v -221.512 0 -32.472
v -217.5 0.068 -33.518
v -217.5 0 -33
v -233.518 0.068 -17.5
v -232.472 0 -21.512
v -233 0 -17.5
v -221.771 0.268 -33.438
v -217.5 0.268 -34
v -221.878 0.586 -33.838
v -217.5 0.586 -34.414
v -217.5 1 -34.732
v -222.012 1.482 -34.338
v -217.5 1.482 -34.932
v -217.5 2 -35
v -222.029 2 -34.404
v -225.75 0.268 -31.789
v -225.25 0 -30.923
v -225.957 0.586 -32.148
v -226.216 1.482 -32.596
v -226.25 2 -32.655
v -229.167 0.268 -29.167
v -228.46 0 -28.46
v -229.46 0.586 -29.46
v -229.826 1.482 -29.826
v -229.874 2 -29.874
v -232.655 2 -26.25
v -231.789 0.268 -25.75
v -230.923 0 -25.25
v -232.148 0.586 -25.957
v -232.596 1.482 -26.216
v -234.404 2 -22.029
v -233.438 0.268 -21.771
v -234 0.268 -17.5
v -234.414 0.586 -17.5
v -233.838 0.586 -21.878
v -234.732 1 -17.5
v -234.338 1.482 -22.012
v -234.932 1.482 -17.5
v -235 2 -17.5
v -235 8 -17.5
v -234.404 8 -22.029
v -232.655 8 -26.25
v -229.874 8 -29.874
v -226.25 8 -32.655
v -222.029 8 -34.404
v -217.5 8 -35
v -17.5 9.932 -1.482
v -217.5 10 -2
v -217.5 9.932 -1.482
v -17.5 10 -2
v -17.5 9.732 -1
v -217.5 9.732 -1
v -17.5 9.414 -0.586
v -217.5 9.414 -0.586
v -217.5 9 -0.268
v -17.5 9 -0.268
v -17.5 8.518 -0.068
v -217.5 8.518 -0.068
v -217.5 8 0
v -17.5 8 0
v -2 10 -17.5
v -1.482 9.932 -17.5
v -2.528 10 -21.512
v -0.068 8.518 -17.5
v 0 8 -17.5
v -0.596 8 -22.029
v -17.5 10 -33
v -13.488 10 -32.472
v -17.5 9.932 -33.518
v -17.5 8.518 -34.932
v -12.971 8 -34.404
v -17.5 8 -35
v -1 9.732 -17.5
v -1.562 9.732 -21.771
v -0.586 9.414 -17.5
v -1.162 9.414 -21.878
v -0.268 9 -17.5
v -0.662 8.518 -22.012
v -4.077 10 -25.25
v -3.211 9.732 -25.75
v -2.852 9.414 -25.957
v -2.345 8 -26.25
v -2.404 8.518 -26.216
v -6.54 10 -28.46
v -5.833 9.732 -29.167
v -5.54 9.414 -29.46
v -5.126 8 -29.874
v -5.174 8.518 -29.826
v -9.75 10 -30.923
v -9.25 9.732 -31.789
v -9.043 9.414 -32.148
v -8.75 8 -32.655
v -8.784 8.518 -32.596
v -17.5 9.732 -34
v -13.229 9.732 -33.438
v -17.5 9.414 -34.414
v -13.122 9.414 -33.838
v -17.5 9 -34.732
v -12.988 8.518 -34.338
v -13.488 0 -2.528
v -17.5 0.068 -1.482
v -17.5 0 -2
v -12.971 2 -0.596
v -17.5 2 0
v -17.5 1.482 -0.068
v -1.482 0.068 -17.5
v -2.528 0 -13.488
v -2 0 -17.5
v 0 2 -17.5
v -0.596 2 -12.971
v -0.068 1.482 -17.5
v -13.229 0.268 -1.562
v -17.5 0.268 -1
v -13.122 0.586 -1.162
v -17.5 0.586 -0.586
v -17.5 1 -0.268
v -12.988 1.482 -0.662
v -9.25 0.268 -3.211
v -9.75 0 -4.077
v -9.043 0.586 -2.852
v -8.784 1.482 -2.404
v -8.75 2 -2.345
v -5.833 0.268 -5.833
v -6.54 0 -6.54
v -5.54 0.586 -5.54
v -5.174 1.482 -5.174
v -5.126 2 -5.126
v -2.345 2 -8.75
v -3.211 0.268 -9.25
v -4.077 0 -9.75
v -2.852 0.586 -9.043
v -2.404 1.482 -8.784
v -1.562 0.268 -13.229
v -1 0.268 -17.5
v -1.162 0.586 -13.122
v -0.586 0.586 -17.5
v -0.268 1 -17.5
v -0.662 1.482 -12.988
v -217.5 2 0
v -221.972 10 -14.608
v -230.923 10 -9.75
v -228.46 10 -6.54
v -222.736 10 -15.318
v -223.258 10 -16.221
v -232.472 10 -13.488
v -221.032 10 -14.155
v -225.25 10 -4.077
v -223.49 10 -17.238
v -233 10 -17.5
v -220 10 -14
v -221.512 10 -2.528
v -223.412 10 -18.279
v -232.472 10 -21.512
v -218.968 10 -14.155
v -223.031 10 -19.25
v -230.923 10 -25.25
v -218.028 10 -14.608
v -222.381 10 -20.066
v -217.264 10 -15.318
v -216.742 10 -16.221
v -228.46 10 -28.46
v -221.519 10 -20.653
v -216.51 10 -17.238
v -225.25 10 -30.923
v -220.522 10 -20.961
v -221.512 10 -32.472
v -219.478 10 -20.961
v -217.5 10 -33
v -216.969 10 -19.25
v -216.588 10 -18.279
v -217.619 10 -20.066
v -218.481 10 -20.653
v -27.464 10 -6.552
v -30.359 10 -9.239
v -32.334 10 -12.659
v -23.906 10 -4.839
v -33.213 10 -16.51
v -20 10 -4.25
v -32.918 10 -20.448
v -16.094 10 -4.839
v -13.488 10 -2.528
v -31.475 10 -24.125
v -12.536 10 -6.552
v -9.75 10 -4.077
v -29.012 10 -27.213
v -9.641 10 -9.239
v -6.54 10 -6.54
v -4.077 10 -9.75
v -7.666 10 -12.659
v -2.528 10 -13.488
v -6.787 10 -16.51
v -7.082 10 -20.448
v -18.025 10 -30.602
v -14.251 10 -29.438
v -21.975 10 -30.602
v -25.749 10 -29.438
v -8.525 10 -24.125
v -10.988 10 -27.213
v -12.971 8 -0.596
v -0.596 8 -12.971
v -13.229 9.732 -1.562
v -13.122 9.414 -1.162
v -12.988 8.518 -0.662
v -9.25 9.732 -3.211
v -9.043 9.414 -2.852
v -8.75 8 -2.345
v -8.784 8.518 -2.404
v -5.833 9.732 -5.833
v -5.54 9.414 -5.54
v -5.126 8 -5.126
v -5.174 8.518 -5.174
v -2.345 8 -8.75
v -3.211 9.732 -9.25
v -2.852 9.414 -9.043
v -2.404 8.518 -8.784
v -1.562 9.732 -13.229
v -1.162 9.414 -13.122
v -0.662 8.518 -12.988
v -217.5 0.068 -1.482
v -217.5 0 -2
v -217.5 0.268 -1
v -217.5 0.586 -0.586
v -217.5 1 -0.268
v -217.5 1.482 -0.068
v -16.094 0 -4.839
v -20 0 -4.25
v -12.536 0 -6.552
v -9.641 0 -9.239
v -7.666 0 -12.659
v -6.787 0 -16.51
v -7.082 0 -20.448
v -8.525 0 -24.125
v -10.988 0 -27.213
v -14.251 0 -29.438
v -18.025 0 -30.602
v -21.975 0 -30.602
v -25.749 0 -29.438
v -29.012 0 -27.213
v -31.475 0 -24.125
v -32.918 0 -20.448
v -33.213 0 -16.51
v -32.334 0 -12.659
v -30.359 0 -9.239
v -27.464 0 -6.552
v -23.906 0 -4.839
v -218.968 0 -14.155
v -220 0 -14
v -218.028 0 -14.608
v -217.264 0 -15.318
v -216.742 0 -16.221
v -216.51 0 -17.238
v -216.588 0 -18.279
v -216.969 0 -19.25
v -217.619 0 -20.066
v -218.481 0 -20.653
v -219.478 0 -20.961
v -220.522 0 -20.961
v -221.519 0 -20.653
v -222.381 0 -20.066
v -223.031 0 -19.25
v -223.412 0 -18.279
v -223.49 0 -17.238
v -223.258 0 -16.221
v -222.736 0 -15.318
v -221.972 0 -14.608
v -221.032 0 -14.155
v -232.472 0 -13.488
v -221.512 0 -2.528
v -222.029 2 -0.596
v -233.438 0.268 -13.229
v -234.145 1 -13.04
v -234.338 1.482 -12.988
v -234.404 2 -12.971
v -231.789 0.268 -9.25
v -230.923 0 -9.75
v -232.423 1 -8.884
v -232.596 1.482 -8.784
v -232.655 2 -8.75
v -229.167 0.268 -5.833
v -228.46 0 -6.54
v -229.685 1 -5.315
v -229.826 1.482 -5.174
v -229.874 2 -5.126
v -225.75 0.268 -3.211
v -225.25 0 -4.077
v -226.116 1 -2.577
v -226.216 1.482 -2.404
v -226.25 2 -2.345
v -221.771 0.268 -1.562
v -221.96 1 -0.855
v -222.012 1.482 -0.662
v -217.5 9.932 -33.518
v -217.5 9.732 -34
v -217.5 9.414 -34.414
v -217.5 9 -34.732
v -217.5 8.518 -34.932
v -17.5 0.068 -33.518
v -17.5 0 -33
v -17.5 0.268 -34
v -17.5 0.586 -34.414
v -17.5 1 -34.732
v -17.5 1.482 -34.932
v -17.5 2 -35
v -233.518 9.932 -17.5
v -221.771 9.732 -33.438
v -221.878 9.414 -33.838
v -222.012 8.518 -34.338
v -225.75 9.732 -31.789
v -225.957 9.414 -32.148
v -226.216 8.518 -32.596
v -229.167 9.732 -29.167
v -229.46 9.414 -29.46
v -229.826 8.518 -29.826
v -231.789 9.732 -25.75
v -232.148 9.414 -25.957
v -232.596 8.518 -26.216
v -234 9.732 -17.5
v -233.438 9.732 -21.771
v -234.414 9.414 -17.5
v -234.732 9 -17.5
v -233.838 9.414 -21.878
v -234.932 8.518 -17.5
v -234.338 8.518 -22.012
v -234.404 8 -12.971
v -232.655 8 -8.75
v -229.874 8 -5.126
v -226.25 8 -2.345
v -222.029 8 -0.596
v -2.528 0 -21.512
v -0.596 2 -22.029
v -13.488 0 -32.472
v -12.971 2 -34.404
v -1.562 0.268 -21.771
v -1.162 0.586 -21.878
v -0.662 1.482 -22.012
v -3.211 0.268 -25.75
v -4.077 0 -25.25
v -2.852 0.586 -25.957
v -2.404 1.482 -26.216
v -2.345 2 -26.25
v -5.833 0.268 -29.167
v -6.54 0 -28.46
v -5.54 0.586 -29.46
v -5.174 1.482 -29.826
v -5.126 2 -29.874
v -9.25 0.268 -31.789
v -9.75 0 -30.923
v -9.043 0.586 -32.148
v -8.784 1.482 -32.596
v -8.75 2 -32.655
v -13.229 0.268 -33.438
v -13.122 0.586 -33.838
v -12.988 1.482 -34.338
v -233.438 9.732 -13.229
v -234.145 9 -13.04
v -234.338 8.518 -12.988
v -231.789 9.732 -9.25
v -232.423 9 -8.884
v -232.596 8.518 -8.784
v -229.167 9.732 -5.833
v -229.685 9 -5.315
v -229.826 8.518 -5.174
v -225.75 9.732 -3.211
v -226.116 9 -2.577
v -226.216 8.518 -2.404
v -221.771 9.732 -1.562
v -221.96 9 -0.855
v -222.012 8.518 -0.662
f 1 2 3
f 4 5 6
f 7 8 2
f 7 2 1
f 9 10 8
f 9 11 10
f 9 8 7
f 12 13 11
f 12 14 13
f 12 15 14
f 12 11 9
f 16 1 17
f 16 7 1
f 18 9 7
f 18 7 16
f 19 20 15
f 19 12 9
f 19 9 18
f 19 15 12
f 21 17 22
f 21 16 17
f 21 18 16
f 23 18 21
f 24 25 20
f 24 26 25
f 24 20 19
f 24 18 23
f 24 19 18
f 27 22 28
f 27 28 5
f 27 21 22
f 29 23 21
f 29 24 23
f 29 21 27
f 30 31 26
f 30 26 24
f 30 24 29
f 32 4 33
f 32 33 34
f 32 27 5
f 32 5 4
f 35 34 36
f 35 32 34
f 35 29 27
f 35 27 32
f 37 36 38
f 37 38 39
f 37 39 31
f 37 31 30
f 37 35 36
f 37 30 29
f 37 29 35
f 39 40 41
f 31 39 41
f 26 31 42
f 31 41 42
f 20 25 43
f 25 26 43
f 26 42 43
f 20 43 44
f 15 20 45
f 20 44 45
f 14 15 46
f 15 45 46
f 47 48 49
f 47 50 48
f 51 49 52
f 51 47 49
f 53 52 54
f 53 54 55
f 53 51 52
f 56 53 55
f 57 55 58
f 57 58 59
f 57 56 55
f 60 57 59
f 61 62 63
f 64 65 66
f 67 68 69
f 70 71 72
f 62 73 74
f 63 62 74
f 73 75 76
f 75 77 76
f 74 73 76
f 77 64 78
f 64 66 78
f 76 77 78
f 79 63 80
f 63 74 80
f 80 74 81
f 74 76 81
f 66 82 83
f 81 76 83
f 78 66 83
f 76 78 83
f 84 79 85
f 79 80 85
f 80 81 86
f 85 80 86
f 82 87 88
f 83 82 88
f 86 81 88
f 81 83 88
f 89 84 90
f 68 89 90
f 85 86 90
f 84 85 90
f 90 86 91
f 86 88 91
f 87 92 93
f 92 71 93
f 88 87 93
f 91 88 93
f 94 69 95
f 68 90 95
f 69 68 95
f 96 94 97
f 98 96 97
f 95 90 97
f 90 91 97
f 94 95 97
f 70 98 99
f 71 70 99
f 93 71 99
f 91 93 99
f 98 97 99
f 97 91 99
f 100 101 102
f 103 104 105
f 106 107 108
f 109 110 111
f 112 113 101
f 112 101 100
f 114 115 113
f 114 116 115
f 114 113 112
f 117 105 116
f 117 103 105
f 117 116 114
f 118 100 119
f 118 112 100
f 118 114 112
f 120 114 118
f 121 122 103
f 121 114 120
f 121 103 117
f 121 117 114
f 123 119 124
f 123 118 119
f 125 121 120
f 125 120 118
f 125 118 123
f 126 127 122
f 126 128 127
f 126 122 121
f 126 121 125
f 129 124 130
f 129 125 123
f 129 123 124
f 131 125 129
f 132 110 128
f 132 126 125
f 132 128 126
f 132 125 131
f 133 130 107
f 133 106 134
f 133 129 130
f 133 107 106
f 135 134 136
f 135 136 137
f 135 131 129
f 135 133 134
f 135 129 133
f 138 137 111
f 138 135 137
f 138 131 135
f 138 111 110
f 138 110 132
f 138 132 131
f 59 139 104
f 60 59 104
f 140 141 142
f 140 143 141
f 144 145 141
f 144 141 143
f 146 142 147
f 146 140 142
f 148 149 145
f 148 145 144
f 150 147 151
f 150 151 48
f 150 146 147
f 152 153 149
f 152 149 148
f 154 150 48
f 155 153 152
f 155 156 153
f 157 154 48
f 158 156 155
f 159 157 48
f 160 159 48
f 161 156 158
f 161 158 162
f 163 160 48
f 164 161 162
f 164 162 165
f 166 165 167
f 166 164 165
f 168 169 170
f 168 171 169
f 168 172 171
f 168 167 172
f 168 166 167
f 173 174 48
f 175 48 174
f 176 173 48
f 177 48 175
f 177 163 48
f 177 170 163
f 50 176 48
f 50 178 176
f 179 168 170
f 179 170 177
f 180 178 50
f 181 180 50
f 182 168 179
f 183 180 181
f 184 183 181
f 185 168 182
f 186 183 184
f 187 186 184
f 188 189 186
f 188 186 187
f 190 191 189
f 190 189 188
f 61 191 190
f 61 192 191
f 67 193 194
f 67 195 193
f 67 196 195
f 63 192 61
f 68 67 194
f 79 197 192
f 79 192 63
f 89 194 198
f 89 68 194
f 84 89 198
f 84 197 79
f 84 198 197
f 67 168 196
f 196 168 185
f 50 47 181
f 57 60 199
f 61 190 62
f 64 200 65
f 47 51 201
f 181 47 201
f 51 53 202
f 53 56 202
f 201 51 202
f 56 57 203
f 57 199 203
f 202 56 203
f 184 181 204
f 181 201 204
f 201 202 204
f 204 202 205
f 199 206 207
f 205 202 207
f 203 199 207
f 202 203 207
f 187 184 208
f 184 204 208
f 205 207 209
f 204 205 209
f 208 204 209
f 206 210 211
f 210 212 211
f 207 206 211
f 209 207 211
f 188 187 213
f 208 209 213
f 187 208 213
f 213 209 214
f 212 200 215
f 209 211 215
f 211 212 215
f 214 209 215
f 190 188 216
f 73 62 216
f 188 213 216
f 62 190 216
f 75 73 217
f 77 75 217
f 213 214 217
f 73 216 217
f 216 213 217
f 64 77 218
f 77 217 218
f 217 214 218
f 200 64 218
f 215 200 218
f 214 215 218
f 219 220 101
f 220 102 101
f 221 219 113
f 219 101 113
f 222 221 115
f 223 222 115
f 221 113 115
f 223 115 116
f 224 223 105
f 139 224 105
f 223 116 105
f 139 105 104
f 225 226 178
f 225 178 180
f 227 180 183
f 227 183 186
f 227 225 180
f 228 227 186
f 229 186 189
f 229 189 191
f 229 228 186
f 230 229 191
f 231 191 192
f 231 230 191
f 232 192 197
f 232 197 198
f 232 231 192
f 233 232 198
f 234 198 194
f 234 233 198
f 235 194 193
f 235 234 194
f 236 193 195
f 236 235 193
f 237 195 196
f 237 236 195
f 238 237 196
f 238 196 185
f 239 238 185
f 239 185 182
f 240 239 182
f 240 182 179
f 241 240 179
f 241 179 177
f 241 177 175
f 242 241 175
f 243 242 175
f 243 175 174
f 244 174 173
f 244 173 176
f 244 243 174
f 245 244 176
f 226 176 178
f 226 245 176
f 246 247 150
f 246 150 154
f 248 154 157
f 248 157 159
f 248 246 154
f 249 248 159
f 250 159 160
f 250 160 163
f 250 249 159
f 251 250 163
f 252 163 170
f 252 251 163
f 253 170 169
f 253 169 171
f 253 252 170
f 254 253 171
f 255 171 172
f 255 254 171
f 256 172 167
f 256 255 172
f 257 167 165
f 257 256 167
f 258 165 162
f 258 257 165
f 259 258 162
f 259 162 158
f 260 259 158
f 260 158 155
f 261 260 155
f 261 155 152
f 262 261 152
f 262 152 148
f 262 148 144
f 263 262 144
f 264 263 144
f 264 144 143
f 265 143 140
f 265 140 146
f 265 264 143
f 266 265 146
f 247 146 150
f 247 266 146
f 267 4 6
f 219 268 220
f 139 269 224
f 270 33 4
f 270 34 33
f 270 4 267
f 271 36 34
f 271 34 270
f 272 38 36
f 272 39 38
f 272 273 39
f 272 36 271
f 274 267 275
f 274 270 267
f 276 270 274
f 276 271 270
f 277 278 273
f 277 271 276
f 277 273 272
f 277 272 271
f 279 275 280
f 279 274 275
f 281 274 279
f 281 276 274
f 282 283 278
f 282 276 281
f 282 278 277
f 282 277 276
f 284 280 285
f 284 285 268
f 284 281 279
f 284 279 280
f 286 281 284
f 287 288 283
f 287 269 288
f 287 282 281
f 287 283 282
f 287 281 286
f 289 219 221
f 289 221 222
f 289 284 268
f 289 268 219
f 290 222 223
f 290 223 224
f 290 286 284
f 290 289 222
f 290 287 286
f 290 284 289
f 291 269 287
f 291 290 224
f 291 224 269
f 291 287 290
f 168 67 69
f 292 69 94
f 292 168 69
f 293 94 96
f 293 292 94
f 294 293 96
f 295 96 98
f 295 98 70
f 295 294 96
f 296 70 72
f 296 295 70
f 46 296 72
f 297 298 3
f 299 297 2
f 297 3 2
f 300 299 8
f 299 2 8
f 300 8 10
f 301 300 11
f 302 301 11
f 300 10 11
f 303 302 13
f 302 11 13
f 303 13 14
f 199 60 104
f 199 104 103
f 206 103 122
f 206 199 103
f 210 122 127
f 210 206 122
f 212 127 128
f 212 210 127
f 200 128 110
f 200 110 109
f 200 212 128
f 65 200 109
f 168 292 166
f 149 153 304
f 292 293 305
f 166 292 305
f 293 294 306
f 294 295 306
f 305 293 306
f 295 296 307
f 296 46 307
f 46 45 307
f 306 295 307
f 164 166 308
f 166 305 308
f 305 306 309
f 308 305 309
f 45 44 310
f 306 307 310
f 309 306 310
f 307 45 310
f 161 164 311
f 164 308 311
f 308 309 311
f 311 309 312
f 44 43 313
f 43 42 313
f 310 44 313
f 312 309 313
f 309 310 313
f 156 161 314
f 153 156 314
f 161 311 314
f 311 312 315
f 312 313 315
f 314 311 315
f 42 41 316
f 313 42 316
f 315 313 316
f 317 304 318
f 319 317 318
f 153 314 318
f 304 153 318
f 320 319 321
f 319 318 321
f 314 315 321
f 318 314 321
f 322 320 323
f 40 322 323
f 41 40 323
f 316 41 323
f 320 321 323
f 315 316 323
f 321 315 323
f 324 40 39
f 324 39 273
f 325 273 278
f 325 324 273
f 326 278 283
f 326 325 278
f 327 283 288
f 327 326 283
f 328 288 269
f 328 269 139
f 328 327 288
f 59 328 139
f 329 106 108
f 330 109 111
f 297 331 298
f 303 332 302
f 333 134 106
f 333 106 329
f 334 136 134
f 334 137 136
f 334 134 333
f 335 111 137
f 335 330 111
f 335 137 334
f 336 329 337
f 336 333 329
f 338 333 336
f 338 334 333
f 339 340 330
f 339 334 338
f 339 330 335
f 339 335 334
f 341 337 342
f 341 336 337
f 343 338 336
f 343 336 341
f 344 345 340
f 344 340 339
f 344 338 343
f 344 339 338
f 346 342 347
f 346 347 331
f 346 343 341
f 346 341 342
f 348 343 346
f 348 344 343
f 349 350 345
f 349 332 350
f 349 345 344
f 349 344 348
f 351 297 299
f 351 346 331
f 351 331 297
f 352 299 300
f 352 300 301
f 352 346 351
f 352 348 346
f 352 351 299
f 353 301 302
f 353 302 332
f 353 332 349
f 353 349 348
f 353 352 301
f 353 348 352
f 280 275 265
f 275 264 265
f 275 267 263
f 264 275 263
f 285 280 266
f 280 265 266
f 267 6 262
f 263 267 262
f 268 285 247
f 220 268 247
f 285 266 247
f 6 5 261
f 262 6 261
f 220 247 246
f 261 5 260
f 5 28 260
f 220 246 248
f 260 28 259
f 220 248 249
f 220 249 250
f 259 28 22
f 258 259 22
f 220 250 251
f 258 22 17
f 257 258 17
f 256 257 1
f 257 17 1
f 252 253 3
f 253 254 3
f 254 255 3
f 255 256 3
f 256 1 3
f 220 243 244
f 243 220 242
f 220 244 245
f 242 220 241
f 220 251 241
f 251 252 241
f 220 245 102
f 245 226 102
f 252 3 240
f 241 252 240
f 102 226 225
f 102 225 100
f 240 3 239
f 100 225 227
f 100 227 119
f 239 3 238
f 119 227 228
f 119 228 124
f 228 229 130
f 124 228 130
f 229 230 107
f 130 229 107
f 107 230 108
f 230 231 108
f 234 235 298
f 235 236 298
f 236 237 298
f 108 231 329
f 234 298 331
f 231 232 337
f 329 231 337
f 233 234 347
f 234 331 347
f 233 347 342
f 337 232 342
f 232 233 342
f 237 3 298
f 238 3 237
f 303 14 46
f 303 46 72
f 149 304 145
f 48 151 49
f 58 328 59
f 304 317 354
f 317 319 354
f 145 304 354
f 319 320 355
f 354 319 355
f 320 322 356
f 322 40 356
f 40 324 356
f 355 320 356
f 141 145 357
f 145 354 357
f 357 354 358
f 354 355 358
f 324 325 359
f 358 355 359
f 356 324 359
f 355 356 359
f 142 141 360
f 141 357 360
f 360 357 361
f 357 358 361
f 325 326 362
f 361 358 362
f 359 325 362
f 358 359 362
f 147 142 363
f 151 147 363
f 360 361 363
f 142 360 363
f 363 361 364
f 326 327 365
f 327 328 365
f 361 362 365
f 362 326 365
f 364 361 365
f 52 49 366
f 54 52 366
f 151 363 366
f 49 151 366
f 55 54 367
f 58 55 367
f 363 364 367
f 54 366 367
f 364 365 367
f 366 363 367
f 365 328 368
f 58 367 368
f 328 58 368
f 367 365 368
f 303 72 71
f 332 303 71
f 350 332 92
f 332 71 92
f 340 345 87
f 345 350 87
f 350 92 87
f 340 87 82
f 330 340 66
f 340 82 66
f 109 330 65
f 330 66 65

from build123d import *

# Parameters (mm, degrees)
CROQUIS1_W              = 235
CROQUIS1_H              = 35
CROQUIS1_R              = 13.25
CROQUIS1_R_2            = 3.5
SALIENTE_EXTRUIR1_DEPTH = 10
REDONDEO1_R             = 17.5
REDONDEO2_R             = 2


with BuildPart() as part:
    # Croquis1 → Saliente-Extruir1 (new body)
    with BuildSketch(Plane(origin=(0, 0, 0), x_dir=(1, 0, 0), z_dir=(0, 1, 0))):
        with Locations((-117.5, 17.5)):
            Rectangle(CROQUIS1_W, CROQUIS1_H)
        with Locations(Location((-20, 17.5, 0), (0, 0, 270))):
            Circle(CROQUIS1_R, mode=Mode.SUBTRACT)
        with Locations(Location((-220, 17.5, 0), (0, 0, 270))):
            Circle(CROQUIS1_R_2, mode=Mode.SUBTRACT)
    extrude(amount=SALIENTE_EXTRUIR1_DEPTH)

    # Redondeo1
    redondeo1_edges = [part.edges().sort_by_distance(p)[0] for p in [
        (0, 5, 0),
        (0, 5, -35),
        (-235, 5, -35),
        (-235, 5, 0),
    ]]
    fillet(redondeo1_edges, radius=REDONDEO1_R - 0.0001)  # a hair under: the kernel refuses the full size

    # Redondeo2
    redondeo2_edges = [part.edges().sort_by_distance(p)[0] for p in [
        (-117.5, 0, 0),
        (-117.5, 0, -35),
        (-229.87439796, 0, -5.12560204),
        (-229.87439796, 0, -29.87439796),
        (-5.12560204, 0, -29.87439796),
        (-5.12560204, 0, -5.12560204),
        (-117.5, 10, 0),
        (-117.5, 10, -35),
        (-229.87439796, 10, -5.12560204),
        (-229.87439796, 10, -29.87439796),
        (-5.12560204, 10, -29.87439796),
        (-5.12560204, 10, -5.12560204),
    ]]
    fillet(redondeo2_edges, radius=REDONDEO2_R)


solid = part.part
